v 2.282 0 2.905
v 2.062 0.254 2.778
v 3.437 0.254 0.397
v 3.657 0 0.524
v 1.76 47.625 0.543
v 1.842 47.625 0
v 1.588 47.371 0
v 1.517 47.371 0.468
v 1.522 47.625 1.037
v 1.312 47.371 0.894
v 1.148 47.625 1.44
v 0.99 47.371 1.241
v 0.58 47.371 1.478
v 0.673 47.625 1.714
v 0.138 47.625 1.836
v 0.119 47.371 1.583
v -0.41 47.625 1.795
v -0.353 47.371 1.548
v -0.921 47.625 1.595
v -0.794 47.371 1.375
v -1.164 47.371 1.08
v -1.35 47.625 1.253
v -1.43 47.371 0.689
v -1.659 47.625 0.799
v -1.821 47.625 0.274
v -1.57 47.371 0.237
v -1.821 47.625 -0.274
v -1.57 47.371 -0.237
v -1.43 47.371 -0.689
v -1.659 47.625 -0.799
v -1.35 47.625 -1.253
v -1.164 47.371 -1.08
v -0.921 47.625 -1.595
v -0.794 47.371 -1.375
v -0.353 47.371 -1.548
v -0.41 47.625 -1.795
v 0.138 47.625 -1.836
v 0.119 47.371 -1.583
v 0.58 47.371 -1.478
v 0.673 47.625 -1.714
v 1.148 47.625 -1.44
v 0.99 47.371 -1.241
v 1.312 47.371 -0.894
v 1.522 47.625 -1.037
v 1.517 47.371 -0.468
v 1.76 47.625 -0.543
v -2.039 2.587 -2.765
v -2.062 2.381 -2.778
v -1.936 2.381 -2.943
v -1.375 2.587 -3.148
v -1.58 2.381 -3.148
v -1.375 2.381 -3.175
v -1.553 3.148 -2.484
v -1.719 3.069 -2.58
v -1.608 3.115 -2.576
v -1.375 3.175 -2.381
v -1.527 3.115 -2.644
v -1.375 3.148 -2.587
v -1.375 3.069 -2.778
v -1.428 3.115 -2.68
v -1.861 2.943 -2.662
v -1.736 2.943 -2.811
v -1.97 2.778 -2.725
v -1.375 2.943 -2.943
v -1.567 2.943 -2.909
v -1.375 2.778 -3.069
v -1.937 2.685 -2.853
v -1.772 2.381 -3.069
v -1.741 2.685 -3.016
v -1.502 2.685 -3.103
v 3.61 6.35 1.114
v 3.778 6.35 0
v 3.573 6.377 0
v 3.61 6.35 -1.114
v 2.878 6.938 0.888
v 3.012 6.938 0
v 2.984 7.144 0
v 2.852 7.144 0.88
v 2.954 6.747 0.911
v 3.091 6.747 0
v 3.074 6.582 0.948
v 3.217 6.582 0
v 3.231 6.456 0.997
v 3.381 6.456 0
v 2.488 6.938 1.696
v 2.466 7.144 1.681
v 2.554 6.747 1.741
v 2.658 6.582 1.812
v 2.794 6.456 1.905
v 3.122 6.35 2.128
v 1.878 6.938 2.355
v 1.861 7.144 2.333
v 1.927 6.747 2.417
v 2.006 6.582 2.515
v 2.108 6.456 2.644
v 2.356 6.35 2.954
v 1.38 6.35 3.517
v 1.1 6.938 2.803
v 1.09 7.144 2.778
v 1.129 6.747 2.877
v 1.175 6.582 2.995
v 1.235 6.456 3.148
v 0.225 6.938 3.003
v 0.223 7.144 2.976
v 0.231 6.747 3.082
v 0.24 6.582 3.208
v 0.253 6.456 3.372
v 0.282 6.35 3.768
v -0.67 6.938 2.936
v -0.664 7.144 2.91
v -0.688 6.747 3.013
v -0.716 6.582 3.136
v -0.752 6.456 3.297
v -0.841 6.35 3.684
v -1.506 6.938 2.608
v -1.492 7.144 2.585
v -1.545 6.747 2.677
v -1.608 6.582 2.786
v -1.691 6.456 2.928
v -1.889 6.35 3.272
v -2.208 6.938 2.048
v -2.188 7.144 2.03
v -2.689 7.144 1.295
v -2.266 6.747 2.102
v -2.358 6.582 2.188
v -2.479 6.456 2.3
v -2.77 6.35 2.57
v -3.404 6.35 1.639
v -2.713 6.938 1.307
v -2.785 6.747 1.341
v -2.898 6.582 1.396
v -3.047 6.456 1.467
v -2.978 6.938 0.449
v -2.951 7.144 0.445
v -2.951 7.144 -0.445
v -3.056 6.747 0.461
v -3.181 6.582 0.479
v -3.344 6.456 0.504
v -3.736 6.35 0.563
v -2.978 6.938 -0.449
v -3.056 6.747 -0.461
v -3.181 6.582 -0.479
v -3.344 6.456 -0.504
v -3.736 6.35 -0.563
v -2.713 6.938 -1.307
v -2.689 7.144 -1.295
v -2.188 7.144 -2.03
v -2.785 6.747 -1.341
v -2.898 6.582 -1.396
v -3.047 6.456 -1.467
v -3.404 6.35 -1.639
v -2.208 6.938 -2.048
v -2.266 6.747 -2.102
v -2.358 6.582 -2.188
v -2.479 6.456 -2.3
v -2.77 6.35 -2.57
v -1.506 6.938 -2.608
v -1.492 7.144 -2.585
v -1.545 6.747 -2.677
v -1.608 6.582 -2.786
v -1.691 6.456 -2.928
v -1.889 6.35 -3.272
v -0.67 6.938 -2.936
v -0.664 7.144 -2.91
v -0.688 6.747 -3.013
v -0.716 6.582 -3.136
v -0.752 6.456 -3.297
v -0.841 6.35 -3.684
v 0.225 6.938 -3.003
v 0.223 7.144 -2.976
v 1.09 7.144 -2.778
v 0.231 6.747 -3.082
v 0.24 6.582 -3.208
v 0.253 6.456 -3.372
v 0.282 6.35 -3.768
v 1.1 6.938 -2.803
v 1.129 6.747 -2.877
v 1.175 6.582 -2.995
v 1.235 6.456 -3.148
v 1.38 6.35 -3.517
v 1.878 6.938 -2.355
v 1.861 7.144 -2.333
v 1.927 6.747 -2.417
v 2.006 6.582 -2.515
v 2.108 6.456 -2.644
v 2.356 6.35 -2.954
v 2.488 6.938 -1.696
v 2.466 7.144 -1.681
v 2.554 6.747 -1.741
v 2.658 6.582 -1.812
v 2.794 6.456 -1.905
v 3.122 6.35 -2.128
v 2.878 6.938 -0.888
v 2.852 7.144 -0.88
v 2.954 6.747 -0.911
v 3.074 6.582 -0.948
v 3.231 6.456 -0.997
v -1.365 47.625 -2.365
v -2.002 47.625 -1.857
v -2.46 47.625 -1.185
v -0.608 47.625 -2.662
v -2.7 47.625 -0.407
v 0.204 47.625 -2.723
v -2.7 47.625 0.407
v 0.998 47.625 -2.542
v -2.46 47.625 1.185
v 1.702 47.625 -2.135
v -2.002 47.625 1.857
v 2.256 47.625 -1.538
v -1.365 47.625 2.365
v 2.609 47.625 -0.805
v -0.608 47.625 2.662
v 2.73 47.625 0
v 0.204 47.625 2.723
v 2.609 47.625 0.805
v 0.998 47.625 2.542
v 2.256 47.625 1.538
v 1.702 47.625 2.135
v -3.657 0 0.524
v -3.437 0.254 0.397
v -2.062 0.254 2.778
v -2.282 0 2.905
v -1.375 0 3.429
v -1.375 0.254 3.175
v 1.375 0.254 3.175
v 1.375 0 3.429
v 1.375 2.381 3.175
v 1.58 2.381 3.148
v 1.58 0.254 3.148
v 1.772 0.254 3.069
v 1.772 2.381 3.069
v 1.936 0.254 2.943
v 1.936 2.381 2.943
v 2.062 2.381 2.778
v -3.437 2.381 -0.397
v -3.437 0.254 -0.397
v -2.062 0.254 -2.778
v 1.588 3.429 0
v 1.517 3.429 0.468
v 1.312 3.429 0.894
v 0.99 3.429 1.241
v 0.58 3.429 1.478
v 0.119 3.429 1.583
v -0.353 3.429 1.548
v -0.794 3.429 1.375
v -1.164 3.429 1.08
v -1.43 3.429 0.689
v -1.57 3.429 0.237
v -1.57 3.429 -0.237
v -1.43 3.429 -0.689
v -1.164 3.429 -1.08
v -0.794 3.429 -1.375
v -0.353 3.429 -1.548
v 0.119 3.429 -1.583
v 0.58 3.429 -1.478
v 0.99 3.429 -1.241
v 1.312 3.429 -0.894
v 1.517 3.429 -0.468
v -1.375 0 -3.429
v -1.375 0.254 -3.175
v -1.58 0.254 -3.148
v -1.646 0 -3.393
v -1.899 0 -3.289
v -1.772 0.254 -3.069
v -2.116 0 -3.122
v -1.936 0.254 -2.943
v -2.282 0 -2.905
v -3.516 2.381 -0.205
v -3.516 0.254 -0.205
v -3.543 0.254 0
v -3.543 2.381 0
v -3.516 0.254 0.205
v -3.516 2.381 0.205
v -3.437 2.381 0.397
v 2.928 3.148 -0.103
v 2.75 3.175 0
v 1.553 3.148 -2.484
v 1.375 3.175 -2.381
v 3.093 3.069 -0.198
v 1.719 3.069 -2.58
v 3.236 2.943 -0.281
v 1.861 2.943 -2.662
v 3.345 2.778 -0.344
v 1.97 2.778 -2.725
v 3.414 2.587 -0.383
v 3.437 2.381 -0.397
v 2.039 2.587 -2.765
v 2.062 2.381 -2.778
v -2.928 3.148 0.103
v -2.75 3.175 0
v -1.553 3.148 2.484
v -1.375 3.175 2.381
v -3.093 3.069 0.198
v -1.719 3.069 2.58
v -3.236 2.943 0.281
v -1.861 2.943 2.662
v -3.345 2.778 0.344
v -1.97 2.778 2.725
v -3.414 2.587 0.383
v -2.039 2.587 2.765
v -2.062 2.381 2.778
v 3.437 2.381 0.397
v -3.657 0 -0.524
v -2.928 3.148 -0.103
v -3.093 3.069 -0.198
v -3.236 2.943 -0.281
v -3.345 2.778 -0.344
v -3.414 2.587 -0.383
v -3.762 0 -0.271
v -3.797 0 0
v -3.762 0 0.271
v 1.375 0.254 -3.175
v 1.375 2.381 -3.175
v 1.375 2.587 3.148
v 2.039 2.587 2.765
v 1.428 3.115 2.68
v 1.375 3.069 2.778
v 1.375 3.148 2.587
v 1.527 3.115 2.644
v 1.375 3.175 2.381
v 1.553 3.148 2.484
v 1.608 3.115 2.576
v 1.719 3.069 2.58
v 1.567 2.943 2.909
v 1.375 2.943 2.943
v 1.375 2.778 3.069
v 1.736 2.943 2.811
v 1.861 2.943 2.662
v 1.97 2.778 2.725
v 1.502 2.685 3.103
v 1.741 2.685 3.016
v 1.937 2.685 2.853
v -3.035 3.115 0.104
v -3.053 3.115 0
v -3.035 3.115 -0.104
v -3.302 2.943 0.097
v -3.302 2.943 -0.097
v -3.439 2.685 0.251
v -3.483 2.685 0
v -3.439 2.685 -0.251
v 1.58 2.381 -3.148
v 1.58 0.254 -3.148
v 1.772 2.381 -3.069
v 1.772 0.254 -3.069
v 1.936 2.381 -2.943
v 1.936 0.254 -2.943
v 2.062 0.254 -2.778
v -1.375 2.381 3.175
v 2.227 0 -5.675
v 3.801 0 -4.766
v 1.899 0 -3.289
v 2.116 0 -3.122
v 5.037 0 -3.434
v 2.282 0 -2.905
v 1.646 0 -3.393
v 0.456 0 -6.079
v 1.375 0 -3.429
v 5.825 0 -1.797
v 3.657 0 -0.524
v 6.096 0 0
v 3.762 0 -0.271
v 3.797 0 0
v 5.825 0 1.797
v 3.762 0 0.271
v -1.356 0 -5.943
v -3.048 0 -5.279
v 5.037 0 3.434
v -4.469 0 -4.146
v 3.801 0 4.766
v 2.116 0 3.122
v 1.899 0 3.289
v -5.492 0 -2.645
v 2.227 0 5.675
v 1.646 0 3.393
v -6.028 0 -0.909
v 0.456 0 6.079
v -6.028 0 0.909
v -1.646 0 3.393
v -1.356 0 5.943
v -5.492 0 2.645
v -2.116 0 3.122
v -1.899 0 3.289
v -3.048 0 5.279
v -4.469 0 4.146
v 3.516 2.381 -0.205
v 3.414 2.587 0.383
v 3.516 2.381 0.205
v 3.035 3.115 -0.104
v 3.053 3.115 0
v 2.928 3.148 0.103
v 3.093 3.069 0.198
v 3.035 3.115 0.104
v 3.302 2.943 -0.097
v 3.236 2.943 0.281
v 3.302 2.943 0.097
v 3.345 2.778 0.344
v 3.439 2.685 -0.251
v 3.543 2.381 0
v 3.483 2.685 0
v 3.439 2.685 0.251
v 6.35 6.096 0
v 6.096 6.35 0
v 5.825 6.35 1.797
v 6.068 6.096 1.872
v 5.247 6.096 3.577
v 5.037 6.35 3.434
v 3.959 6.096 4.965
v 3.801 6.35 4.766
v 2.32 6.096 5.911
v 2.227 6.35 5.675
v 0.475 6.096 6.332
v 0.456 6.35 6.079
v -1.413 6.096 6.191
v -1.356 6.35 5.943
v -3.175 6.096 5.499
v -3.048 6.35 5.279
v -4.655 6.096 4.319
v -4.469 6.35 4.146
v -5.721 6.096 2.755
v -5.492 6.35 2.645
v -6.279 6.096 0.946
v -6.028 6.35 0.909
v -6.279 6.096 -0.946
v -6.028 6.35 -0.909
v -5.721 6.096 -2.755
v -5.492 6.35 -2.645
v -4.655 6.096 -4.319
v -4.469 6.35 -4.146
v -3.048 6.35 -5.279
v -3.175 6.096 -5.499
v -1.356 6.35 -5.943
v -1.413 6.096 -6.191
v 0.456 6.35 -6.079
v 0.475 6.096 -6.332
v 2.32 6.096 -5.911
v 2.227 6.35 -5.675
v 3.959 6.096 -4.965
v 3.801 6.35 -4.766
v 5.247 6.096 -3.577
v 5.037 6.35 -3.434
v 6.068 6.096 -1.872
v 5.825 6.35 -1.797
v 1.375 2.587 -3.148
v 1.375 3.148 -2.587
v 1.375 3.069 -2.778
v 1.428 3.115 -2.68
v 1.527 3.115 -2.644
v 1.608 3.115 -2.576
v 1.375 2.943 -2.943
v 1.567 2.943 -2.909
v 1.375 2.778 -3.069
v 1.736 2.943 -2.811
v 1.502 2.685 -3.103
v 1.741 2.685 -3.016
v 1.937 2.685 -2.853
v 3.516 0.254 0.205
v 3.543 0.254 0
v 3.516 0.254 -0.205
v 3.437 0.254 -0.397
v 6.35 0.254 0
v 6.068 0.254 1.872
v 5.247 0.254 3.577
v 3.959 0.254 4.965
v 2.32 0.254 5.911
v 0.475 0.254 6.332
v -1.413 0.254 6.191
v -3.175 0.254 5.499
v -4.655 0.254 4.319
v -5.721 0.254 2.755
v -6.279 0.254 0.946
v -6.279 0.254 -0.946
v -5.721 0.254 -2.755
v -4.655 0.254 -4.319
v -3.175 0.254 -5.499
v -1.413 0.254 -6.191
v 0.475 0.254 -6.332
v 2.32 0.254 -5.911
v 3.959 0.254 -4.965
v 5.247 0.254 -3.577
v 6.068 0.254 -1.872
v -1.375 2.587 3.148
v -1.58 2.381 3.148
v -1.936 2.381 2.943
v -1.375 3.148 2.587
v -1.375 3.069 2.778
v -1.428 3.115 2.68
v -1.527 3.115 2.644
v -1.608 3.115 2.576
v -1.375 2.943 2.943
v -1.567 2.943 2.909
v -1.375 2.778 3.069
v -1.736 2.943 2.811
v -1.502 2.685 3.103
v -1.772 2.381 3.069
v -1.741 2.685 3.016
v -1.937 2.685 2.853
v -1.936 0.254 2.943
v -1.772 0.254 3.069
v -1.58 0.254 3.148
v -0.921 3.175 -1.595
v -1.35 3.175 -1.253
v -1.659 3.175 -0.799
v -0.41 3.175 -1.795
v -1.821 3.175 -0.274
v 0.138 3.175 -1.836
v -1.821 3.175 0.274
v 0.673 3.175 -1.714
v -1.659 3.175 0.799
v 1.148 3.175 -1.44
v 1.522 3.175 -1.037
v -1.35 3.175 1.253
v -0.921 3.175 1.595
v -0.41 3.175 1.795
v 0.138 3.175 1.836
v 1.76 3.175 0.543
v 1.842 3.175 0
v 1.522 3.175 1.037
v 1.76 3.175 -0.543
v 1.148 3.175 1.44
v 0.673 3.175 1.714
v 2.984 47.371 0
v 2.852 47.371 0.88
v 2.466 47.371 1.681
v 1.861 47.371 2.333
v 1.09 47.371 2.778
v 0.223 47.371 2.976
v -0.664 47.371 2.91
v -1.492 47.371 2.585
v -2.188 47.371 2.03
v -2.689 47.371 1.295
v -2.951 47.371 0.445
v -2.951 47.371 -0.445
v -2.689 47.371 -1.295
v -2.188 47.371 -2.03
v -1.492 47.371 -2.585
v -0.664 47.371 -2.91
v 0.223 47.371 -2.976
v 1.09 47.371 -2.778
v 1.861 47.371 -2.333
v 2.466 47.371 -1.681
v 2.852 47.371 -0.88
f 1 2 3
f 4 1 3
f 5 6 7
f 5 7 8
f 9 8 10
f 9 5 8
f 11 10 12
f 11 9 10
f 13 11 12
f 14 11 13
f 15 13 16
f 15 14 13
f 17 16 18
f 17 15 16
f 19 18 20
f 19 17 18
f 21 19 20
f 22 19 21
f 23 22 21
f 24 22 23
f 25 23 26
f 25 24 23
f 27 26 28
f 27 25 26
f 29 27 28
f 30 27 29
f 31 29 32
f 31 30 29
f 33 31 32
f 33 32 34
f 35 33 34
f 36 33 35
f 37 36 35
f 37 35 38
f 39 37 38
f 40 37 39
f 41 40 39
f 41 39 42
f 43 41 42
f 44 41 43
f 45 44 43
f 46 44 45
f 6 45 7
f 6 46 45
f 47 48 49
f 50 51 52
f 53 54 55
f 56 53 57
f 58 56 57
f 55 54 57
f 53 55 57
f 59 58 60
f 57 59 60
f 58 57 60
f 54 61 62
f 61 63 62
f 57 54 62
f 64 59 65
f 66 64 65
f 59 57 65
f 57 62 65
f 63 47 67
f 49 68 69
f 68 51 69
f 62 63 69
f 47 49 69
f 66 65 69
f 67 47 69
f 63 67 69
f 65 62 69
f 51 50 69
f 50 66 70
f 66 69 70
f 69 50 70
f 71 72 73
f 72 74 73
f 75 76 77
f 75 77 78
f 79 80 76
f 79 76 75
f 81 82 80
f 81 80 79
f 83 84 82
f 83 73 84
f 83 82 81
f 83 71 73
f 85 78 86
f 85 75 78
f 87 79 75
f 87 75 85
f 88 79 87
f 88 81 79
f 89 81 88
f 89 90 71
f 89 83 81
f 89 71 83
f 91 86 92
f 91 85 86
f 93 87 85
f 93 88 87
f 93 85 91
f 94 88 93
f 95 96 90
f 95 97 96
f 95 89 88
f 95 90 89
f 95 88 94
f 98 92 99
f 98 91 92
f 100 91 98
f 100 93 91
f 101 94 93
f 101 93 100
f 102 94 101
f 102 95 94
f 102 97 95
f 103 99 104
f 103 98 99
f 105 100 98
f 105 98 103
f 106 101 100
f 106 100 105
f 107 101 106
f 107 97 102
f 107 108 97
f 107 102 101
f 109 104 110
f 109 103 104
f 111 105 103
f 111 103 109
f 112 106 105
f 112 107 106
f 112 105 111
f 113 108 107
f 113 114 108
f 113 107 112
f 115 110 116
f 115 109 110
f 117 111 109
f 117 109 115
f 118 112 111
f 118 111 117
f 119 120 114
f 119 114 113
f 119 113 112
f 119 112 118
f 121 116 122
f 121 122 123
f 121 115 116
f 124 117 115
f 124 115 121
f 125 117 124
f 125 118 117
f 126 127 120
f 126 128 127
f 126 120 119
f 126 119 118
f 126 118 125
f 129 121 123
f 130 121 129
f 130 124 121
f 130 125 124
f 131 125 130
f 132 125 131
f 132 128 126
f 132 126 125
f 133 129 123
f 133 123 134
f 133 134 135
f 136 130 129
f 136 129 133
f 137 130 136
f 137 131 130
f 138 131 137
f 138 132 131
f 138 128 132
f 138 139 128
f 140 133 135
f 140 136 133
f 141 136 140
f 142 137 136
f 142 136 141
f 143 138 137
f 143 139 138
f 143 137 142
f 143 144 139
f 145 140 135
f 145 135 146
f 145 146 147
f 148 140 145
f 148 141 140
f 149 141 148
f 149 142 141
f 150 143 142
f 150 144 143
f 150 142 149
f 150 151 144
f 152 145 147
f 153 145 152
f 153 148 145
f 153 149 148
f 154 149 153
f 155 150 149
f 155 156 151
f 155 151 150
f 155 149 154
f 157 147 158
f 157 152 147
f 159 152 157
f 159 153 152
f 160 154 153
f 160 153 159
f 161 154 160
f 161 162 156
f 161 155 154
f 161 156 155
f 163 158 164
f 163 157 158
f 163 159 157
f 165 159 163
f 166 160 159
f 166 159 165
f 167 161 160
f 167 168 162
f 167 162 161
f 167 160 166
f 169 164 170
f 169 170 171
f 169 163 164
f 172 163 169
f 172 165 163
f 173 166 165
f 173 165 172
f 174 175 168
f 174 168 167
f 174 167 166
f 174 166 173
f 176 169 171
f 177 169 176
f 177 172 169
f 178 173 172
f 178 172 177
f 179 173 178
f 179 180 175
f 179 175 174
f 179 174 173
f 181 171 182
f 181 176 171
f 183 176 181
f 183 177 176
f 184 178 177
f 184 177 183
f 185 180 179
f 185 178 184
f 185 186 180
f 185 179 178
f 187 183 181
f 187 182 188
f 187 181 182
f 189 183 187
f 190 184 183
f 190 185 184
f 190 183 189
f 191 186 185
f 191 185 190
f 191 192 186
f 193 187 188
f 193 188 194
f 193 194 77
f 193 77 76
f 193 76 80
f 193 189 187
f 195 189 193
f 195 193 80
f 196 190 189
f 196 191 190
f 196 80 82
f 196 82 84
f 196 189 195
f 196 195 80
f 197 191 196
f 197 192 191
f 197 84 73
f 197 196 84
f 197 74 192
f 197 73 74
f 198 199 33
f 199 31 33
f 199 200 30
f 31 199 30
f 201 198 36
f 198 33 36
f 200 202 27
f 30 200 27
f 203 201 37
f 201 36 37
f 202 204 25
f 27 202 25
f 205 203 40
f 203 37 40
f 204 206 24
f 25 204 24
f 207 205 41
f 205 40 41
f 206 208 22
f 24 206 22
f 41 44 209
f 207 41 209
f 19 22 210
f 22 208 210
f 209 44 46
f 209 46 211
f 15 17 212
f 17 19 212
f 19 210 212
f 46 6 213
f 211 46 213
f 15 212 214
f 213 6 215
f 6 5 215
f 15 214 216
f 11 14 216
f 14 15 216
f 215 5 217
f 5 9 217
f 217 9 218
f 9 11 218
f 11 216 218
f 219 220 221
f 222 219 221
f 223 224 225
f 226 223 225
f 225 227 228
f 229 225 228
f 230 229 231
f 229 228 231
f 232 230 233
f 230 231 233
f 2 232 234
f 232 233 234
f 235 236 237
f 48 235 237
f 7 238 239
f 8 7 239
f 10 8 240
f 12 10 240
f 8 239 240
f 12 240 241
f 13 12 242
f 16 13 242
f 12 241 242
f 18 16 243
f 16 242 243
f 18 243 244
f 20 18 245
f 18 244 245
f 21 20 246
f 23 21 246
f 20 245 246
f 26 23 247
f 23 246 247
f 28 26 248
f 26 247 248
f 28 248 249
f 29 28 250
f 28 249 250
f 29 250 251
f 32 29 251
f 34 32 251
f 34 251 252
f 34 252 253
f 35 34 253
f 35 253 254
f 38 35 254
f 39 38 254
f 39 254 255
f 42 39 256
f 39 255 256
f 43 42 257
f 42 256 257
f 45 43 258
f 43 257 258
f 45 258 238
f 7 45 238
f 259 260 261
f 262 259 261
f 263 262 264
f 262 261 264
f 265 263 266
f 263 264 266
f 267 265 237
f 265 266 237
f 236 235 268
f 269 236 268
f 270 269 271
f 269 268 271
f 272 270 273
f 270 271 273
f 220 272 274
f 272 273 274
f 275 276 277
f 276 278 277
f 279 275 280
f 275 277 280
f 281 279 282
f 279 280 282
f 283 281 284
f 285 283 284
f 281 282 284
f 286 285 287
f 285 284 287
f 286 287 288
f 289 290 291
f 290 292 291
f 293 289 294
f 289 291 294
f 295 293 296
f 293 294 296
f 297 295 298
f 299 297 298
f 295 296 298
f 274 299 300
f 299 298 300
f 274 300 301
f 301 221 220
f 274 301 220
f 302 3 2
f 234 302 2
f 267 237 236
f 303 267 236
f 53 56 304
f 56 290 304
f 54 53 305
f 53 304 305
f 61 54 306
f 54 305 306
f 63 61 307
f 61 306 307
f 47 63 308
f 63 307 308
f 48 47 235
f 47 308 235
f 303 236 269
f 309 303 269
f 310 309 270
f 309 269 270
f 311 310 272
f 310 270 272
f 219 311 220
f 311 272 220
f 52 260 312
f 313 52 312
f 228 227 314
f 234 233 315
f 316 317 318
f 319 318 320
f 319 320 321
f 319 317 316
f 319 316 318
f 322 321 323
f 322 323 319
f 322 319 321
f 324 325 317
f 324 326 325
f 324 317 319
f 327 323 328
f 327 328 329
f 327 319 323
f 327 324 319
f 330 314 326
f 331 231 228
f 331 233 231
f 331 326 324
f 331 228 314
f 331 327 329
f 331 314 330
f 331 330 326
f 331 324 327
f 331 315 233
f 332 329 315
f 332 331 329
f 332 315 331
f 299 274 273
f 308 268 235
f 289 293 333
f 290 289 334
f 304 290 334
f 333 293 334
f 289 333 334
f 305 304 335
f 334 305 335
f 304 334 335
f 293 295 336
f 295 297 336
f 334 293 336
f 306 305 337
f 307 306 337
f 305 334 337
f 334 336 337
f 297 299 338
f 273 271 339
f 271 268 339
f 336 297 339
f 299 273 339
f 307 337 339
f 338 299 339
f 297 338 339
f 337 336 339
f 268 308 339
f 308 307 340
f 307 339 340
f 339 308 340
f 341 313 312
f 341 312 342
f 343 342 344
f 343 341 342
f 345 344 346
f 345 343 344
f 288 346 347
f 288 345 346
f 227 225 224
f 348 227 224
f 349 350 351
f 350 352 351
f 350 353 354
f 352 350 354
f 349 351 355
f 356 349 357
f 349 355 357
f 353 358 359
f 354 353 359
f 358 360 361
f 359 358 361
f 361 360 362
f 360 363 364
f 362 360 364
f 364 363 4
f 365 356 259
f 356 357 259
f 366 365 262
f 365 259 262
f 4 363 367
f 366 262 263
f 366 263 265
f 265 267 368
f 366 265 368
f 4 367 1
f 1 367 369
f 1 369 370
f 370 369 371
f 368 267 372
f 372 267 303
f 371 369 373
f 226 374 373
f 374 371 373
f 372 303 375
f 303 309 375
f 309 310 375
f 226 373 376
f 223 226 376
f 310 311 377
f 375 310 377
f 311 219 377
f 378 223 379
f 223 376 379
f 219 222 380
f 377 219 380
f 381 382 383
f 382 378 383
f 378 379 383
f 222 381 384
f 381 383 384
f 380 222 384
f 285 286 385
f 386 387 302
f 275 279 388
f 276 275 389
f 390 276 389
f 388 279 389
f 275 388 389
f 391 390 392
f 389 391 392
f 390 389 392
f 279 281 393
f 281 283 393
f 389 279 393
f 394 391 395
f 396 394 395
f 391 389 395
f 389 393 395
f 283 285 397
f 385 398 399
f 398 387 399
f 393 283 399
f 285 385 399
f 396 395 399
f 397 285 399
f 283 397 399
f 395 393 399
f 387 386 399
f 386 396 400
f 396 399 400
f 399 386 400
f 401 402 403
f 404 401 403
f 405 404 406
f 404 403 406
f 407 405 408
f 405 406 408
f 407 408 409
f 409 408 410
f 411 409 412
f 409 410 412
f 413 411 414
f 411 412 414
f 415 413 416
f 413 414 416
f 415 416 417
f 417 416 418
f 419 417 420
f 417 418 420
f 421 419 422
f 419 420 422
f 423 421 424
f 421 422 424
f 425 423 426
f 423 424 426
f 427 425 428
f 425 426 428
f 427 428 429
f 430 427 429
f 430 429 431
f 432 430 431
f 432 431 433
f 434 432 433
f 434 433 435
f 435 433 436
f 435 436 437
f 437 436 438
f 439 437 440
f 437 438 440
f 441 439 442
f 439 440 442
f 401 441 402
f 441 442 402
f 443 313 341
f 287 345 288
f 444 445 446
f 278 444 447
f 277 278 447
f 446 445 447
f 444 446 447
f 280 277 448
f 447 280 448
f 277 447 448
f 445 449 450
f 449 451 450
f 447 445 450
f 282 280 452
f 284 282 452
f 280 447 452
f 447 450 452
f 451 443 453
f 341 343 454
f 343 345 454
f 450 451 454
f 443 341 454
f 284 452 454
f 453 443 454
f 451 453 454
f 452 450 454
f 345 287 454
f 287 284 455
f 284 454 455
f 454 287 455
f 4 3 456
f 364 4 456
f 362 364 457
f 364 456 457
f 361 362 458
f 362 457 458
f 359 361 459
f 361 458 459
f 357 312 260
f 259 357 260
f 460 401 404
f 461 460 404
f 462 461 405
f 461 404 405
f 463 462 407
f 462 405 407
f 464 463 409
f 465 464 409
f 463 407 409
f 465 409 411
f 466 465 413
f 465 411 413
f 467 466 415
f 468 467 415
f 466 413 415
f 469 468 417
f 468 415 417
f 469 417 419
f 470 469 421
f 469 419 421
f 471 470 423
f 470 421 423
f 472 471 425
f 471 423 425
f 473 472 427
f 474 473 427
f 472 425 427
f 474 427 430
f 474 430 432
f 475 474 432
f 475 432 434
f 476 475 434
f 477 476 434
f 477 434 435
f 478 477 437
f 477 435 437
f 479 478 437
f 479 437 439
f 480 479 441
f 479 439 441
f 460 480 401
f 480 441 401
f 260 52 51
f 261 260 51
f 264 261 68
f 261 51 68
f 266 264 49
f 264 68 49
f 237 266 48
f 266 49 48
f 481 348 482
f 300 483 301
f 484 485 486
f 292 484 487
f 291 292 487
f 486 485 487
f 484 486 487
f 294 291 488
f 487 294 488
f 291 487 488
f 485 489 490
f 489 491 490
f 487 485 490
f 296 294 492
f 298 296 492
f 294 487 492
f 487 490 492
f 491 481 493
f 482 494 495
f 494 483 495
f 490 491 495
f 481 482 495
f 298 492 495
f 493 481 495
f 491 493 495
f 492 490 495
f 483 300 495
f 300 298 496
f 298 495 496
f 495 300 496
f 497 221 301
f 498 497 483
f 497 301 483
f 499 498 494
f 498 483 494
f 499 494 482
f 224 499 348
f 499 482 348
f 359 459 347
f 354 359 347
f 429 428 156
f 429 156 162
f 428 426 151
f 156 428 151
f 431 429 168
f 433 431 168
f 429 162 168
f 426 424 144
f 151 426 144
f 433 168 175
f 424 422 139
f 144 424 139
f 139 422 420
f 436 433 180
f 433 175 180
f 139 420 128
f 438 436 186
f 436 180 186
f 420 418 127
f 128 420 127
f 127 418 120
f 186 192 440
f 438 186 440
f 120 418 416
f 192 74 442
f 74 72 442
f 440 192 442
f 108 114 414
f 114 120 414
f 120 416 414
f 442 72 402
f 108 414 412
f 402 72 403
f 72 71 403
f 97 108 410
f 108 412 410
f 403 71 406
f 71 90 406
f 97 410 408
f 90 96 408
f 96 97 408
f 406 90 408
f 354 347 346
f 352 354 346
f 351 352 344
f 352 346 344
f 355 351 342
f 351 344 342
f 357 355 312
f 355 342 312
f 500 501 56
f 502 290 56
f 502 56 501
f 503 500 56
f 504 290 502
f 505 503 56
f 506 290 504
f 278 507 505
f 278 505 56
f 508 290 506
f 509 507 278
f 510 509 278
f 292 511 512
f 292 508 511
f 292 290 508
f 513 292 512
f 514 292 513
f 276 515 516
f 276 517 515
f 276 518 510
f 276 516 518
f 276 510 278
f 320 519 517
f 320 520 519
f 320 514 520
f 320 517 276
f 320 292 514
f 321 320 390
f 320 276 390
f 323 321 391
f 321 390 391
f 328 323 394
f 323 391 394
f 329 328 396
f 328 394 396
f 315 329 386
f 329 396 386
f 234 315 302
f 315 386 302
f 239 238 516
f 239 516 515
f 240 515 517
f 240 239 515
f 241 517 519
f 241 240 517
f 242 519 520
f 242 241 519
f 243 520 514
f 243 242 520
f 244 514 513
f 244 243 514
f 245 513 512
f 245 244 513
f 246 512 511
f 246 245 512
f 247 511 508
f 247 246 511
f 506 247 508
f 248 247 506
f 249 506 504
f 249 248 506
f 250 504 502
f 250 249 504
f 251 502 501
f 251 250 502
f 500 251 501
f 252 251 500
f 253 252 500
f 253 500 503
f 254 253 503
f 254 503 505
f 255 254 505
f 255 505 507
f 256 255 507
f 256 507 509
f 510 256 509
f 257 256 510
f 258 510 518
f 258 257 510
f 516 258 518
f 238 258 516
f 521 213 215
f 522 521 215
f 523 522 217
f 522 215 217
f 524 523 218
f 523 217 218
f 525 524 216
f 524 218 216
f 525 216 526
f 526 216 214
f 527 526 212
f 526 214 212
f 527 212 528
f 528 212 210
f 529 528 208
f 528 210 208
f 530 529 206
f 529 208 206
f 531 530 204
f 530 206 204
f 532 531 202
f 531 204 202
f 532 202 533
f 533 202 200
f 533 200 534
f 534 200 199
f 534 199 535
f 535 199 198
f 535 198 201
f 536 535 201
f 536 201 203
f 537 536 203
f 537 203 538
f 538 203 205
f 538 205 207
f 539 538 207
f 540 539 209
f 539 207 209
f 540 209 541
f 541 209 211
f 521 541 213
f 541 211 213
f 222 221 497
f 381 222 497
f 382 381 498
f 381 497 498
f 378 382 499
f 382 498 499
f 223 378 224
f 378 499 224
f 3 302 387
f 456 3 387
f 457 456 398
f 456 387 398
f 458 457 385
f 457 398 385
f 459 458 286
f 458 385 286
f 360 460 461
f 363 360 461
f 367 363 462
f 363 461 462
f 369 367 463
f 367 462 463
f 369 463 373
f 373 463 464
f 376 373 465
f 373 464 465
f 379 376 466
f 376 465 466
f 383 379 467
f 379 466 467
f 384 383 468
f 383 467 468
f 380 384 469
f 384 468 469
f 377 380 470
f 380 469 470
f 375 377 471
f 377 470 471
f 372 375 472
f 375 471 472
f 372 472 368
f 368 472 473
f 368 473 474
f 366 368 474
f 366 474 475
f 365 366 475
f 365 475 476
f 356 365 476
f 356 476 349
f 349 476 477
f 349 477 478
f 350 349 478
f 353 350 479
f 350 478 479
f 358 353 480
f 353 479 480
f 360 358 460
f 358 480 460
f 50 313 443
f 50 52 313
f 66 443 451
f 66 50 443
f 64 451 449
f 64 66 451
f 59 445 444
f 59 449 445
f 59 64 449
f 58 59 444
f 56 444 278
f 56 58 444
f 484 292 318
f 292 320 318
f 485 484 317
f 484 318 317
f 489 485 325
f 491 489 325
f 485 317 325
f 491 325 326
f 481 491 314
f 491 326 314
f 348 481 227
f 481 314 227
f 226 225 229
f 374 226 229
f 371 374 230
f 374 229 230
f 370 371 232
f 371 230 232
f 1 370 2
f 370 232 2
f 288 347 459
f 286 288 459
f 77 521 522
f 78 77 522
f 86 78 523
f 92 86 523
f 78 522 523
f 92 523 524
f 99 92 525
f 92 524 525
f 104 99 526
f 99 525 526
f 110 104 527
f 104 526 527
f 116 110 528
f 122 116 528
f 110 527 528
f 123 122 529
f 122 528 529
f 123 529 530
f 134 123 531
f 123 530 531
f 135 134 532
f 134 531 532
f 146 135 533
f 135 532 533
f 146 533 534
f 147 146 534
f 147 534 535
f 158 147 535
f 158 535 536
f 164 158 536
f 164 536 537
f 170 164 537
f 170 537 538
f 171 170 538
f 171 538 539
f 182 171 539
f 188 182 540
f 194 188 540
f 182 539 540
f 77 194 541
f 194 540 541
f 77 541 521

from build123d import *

# Parameters (mm, degrees)
CUT_EXTRUDE1_DEPTH = 3.175
FILLET1_R          = 0.79375
CHAMFER1_SIZE      = 0.254


with BuildPart() as part:
    # Sketch1 → Revolve1 (revolve)
    with BuildSketch(Plane.XY):
        Polygon((3.175, 0), (6.35, 0), (6.35, 6.35), (2.9845, 6.35), (2.9845, 47.625), (1.5875, 47.625), (1.5875, 3.175), (3.175, 3.175), align=None)
    revolve(axis=Axis((0, 5.569325848, 0), (0, -1, 0)))

    # Sketch2 → Cut-Extrude1 (cut)
    with BuildSketch(Plane.XZ):
        Polygon((1.833087105, 3.175), (-1.833087105, 3.175), (-3.666174209, 0), (-1.833087105, -3.175), (1.833087105, -3.175), (3.666174209, 0), align=None)
    extrude(amount=-CUT_EXTRUDE1_DEPTH, mode=Mode.SUBTRACT)

    # Fillet1
    fillet1_edges = [part.edges().sort_by_distance(p)[0] for p in [
        (0, 3.175, 3.175),
        (-2.749630657, 3.175, 1.5875),
        (-2.749630657, 3.175, -1.5875),
        (0, 3.175, -3.175),
        (2.749630657, 3.175, -1.5875),
        (2.749630657, 3.175, 1.5875),
        (-1.833087105, 1.5875, 3.175),
        (-3.666174209, 1.5875, 0),
        (-1.833087105, 1.5875, -3.175),
        (1.833087105, 1.5875, -3.175),
        (3.666174209, 1.5875, 0),
        (1.833087105, 1.5875, 3.175),
        (-2.9845, 6.35, 0),
    ]]
    fillet(fillet1_edges, radius=FILLET1_R)

    # Chamfer1
    chamfer1_edges = [part.edges().sort_by_distance(p)[0] for p in [
        (-1.5875, 3.175, 0),
        (0, 0, 3.175),
        (2.749630657, 0, 1.5875),
        (-1.5875, 47.625, 0),
        (2.749630657, 0, -1.5875),
        (0, 0, -3.175),
        (-2.9845, 47.625, 0),
        (-2.749630657, 0, -1.5875),
        (-2.749630657, 0, 1.5875),
        (-1.771690329, 0, 3.068657664),
        (1.771690329, 0, 3.068657664),
        (3.543380657, 0, 0),
        (1.771690329, 0, -3.068657664),
        (-1.771690329, 0, -3.068657664),
        (-3.543380657, 0, 0),
        (-6.35, 6.35, 0),
        (-6.35, 0, 0),
    ]]
    chamfer(chamfer1_edges, length=CHAMFER1_SIZE)


solid = part.part
